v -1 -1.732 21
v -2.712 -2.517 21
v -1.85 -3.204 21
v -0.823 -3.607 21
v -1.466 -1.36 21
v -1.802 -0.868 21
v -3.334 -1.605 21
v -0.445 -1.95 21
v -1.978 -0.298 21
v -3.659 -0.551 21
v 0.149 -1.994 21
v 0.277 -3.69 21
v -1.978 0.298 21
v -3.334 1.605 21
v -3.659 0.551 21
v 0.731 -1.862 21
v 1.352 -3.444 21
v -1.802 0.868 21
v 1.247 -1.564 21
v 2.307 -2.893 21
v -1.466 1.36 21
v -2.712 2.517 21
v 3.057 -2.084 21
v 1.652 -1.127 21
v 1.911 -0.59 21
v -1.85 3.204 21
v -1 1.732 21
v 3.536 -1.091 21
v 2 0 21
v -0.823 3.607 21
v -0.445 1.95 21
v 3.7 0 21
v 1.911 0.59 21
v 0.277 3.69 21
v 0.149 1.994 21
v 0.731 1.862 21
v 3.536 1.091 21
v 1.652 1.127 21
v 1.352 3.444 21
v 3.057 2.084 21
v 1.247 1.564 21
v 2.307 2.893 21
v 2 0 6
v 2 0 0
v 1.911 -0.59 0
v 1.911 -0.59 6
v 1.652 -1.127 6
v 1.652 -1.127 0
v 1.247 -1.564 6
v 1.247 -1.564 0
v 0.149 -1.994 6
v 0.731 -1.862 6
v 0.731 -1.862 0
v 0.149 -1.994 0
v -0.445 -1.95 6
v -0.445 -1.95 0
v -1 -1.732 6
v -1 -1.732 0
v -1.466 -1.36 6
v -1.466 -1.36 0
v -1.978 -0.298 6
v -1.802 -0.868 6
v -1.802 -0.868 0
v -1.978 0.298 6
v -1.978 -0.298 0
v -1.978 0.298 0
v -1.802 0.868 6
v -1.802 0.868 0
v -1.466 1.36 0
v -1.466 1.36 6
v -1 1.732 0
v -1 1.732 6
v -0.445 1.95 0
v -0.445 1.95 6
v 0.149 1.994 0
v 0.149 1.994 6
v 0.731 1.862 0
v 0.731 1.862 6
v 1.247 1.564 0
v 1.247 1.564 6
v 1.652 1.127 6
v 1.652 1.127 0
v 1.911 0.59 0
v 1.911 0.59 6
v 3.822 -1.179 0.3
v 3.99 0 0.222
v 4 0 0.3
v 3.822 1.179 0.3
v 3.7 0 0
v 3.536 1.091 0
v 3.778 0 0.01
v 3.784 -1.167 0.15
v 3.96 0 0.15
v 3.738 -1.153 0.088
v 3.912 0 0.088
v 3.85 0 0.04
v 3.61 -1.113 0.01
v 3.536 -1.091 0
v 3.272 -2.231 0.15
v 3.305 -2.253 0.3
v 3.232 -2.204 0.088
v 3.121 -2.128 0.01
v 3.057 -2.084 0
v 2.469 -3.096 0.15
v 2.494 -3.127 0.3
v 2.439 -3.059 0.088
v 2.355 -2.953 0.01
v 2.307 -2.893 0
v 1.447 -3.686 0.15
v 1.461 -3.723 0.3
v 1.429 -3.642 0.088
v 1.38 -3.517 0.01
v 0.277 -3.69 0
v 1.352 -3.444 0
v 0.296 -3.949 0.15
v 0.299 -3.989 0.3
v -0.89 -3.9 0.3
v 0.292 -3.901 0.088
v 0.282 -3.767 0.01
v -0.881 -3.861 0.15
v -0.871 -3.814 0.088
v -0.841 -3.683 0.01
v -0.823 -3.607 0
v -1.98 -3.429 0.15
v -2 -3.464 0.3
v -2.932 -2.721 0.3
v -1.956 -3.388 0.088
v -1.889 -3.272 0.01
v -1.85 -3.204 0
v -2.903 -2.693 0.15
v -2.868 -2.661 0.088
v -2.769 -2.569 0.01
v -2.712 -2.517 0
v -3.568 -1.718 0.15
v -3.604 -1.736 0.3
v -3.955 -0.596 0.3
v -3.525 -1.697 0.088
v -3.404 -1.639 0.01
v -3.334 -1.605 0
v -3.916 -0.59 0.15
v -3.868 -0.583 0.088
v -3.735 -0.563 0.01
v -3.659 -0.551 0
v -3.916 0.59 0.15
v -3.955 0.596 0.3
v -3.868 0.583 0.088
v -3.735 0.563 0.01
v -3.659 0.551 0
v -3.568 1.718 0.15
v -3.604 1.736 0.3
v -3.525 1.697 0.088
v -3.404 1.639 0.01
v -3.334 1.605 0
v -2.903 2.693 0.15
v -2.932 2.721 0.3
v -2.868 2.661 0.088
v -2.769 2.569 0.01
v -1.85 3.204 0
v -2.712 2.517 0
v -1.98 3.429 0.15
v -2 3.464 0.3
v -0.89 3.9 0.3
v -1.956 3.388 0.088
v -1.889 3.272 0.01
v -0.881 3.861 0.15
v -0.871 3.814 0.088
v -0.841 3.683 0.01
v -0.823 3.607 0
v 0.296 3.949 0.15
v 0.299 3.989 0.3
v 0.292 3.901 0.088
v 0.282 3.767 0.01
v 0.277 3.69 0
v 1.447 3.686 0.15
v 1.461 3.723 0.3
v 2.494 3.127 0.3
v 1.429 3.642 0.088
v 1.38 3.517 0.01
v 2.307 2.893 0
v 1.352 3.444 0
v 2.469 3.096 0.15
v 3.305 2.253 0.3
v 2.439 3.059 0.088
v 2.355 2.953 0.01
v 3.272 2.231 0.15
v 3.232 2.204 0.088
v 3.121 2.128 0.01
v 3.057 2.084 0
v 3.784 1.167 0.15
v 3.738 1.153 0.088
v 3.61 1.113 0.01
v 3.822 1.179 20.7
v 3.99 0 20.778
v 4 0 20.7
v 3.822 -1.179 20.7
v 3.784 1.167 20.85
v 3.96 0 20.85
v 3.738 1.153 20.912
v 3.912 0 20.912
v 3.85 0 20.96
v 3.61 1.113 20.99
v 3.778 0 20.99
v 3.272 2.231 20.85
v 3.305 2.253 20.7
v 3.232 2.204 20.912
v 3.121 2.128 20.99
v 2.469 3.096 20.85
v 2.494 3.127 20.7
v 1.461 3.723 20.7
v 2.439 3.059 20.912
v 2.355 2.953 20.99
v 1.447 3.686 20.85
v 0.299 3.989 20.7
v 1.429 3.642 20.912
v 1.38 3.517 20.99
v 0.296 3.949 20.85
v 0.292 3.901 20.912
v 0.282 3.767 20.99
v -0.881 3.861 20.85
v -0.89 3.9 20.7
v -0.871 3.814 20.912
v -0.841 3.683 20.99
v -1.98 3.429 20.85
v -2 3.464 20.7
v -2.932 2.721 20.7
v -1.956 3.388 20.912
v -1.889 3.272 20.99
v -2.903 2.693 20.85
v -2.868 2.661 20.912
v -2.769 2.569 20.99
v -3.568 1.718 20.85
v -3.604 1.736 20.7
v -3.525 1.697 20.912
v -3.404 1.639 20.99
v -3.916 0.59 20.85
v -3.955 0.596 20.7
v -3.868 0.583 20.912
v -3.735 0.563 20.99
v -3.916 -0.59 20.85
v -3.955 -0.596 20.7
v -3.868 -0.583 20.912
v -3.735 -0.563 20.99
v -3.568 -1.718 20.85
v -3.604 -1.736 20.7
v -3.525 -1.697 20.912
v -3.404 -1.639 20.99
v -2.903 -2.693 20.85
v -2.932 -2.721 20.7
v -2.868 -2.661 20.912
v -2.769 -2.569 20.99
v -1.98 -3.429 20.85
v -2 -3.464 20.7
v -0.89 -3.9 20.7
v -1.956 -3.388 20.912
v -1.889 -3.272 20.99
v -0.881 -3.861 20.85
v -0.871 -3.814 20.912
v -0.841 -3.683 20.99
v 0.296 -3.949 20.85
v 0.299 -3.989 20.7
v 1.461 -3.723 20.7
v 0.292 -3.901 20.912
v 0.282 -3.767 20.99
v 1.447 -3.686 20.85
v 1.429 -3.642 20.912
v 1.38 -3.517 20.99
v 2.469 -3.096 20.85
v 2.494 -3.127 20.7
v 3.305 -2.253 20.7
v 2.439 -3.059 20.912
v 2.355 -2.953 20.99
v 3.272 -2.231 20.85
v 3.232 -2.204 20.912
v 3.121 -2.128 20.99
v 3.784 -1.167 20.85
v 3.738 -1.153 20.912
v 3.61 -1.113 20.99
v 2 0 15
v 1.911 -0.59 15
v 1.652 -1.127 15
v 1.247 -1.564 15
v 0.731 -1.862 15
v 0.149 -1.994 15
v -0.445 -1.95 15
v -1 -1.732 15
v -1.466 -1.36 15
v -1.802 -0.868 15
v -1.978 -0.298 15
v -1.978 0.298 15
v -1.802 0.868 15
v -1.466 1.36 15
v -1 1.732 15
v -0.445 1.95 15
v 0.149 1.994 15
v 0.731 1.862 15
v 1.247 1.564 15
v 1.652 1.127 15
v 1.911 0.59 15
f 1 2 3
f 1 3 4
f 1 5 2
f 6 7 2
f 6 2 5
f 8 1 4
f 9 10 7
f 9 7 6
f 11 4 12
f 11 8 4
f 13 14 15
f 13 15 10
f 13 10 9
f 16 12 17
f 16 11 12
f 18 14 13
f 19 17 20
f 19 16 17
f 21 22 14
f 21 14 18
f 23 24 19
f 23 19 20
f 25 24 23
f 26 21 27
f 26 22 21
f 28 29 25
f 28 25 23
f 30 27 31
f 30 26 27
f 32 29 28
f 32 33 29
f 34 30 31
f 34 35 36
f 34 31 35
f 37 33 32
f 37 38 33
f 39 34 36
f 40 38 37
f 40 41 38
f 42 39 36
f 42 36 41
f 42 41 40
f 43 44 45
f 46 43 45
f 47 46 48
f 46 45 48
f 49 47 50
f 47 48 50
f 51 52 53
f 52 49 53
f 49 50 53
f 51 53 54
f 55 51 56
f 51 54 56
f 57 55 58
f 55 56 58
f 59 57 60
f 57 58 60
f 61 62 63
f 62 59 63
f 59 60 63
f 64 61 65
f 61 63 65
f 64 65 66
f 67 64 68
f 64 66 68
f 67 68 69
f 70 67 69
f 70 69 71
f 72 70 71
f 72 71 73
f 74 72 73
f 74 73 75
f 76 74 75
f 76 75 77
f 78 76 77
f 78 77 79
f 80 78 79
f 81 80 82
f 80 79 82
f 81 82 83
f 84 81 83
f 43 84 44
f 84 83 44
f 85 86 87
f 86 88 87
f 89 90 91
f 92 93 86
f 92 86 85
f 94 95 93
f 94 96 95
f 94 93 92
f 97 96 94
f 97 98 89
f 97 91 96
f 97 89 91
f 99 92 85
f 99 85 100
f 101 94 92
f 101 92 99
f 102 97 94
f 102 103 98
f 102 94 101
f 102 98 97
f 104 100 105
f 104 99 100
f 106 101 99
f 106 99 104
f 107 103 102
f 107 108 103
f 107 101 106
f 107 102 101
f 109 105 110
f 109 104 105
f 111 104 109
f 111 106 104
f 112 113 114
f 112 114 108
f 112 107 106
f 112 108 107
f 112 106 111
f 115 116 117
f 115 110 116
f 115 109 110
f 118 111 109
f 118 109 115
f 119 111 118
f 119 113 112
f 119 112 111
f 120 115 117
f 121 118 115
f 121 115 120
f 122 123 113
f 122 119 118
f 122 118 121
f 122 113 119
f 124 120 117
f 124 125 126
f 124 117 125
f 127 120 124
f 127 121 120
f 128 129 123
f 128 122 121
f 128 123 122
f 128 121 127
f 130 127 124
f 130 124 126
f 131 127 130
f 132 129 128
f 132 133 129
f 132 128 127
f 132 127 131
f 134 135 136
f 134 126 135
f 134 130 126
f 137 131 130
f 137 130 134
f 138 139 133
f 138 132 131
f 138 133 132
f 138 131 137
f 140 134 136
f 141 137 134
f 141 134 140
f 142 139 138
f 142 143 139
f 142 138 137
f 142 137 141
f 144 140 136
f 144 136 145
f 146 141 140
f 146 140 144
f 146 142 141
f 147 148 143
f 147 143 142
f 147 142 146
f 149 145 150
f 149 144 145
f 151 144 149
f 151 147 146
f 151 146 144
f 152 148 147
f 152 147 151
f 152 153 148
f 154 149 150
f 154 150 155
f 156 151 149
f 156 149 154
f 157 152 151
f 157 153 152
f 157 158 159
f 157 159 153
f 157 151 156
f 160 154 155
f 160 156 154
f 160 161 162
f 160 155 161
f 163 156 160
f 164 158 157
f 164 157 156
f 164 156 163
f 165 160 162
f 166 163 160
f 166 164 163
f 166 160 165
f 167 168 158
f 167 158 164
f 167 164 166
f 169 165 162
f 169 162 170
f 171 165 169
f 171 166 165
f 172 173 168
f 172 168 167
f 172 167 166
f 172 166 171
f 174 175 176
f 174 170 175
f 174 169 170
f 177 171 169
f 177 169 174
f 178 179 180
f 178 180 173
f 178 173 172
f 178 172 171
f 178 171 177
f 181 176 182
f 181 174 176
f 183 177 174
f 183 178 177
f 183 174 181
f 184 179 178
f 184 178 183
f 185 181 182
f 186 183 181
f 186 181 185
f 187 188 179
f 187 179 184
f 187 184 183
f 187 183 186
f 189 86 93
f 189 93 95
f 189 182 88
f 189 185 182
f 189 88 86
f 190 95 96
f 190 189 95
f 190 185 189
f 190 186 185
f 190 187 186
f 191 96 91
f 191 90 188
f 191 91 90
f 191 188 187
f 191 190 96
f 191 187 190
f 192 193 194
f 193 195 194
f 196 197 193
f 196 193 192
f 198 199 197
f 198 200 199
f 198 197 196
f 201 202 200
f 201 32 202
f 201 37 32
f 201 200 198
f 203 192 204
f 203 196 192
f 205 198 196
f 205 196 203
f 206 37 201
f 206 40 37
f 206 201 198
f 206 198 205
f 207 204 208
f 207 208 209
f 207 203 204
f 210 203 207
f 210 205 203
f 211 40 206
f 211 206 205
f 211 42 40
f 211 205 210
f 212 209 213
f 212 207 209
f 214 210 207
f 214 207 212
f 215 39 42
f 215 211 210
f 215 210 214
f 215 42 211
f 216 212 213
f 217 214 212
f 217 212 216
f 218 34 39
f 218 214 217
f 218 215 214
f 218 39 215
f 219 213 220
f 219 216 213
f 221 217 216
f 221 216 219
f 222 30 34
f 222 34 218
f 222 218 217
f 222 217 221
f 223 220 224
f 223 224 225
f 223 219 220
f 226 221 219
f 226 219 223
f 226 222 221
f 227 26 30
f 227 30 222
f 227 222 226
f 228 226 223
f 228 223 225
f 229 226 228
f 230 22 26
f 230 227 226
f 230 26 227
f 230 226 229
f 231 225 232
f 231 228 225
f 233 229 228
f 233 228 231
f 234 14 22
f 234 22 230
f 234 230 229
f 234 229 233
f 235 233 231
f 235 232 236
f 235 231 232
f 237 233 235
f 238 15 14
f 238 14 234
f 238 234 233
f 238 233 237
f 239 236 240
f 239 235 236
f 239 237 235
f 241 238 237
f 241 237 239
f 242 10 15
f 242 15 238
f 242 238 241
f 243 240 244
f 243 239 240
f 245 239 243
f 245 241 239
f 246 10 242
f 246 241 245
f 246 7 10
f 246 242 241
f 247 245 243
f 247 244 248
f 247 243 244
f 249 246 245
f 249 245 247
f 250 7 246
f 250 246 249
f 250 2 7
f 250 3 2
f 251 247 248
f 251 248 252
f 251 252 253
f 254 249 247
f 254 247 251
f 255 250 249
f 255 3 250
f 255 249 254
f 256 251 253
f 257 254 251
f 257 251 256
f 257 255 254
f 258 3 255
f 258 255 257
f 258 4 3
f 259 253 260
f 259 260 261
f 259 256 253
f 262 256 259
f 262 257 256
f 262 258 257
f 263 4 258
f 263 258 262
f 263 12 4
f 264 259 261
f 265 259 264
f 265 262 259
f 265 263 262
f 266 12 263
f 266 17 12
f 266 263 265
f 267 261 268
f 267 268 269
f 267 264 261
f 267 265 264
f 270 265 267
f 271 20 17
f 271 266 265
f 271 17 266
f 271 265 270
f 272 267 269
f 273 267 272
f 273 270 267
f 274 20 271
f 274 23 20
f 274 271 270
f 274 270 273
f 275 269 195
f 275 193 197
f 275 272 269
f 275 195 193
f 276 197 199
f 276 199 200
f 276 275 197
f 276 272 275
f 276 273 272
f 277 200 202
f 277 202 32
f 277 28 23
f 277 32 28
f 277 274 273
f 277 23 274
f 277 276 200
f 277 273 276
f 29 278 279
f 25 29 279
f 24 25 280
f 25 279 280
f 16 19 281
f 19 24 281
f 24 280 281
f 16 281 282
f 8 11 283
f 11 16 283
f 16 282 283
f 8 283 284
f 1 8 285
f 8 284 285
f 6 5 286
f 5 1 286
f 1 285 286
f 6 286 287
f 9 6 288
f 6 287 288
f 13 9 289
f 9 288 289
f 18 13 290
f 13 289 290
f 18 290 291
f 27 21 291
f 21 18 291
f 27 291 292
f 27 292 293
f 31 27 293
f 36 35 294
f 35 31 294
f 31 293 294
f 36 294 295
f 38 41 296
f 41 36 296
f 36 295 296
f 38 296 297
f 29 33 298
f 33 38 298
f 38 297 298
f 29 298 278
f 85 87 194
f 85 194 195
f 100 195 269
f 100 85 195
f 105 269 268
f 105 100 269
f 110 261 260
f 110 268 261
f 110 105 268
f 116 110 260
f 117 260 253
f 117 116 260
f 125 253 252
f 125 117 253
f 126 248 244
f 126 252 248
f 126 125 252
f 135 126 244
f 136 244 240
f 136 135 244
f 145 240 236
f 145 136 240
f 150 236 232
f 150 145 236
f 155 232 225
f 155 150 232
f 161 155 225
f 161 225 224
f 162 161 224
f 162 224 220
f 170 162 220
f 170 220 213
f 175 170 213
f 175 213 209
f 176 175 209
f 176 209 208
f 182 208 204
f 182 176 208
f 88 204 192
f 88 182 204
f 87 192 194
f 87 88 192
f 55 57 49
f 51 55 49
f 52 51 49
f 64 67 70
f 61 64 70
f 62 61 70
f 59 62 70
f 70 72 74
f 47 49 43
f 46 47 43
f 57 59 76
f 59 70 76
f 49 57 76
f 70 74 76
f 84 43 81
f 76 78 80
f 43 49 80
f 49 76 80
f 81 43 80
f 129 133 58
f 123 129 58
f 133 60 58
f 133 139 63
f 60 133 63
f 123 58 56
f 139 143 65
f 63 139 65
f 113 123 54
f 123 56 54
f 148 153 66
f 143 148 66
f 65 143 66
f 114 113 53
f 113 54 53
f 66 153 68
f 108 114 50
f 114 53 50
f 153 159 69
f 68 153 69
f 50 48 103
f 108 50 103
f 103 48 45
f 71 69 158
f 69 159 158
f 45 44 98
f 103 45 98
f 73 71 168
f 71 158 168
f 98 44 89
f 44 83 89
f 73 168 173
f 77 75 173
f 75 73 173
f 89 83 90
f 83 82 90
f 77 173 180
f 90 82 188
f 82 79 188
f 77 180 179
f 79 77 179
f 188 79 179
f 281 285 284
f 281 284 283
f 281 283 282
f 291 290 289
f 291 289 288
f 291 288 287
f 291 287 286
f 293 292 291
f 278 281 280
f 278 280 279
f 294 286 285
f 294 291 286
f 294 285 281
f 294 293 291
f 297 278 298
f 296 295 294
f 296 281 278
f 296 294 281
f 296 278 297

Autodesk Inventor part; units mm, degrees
ref_plane "YZ Plane" through (0, 0, 0) normal (1, 0, 0) x (0, 1, 0)
ref_plane "XZ Plane" through (0, 0, 0) normal (0, 1, 0) x (-1, 0, 0)
ref_plane "XY Plane" through (0, 0, 0) normal (0, 0, 1) x (1, 0, 0)
sketch "スケッチ1" plane through (0, 0, 0) normal (0, 0, 1) x (1, 0, 0)
  circle A0 centre (0, 0) radius 4
  circle A1 centre (0, 0) radius 2
  dimension "d0" = 8
  dimension "d1" = 4
extrude "押し出し1" add sketch "スケッチ1" along normal blind 21
fillet "フィレット1" radius 0.3 2 edges at (-4, 0, 21) (-4, 0, 0)
thread "ねじ1" size "M4x0.7" class "6H" standard "ANSI Metric M Profile" length 100
extrude "押し出し2" add sketch "スケッチ1" along normal blind 15 contours A1
extrude "押し出し3" cut sketch "スケッチ1" along normal blind 6 contours A1
thread "ねじ2" size "M4x0.7" class "6H" standard "ANSI Metric M Profile" full length
properties part number "スペーサーM4L21アルミ" material "アルミニウム 2014-T4"
